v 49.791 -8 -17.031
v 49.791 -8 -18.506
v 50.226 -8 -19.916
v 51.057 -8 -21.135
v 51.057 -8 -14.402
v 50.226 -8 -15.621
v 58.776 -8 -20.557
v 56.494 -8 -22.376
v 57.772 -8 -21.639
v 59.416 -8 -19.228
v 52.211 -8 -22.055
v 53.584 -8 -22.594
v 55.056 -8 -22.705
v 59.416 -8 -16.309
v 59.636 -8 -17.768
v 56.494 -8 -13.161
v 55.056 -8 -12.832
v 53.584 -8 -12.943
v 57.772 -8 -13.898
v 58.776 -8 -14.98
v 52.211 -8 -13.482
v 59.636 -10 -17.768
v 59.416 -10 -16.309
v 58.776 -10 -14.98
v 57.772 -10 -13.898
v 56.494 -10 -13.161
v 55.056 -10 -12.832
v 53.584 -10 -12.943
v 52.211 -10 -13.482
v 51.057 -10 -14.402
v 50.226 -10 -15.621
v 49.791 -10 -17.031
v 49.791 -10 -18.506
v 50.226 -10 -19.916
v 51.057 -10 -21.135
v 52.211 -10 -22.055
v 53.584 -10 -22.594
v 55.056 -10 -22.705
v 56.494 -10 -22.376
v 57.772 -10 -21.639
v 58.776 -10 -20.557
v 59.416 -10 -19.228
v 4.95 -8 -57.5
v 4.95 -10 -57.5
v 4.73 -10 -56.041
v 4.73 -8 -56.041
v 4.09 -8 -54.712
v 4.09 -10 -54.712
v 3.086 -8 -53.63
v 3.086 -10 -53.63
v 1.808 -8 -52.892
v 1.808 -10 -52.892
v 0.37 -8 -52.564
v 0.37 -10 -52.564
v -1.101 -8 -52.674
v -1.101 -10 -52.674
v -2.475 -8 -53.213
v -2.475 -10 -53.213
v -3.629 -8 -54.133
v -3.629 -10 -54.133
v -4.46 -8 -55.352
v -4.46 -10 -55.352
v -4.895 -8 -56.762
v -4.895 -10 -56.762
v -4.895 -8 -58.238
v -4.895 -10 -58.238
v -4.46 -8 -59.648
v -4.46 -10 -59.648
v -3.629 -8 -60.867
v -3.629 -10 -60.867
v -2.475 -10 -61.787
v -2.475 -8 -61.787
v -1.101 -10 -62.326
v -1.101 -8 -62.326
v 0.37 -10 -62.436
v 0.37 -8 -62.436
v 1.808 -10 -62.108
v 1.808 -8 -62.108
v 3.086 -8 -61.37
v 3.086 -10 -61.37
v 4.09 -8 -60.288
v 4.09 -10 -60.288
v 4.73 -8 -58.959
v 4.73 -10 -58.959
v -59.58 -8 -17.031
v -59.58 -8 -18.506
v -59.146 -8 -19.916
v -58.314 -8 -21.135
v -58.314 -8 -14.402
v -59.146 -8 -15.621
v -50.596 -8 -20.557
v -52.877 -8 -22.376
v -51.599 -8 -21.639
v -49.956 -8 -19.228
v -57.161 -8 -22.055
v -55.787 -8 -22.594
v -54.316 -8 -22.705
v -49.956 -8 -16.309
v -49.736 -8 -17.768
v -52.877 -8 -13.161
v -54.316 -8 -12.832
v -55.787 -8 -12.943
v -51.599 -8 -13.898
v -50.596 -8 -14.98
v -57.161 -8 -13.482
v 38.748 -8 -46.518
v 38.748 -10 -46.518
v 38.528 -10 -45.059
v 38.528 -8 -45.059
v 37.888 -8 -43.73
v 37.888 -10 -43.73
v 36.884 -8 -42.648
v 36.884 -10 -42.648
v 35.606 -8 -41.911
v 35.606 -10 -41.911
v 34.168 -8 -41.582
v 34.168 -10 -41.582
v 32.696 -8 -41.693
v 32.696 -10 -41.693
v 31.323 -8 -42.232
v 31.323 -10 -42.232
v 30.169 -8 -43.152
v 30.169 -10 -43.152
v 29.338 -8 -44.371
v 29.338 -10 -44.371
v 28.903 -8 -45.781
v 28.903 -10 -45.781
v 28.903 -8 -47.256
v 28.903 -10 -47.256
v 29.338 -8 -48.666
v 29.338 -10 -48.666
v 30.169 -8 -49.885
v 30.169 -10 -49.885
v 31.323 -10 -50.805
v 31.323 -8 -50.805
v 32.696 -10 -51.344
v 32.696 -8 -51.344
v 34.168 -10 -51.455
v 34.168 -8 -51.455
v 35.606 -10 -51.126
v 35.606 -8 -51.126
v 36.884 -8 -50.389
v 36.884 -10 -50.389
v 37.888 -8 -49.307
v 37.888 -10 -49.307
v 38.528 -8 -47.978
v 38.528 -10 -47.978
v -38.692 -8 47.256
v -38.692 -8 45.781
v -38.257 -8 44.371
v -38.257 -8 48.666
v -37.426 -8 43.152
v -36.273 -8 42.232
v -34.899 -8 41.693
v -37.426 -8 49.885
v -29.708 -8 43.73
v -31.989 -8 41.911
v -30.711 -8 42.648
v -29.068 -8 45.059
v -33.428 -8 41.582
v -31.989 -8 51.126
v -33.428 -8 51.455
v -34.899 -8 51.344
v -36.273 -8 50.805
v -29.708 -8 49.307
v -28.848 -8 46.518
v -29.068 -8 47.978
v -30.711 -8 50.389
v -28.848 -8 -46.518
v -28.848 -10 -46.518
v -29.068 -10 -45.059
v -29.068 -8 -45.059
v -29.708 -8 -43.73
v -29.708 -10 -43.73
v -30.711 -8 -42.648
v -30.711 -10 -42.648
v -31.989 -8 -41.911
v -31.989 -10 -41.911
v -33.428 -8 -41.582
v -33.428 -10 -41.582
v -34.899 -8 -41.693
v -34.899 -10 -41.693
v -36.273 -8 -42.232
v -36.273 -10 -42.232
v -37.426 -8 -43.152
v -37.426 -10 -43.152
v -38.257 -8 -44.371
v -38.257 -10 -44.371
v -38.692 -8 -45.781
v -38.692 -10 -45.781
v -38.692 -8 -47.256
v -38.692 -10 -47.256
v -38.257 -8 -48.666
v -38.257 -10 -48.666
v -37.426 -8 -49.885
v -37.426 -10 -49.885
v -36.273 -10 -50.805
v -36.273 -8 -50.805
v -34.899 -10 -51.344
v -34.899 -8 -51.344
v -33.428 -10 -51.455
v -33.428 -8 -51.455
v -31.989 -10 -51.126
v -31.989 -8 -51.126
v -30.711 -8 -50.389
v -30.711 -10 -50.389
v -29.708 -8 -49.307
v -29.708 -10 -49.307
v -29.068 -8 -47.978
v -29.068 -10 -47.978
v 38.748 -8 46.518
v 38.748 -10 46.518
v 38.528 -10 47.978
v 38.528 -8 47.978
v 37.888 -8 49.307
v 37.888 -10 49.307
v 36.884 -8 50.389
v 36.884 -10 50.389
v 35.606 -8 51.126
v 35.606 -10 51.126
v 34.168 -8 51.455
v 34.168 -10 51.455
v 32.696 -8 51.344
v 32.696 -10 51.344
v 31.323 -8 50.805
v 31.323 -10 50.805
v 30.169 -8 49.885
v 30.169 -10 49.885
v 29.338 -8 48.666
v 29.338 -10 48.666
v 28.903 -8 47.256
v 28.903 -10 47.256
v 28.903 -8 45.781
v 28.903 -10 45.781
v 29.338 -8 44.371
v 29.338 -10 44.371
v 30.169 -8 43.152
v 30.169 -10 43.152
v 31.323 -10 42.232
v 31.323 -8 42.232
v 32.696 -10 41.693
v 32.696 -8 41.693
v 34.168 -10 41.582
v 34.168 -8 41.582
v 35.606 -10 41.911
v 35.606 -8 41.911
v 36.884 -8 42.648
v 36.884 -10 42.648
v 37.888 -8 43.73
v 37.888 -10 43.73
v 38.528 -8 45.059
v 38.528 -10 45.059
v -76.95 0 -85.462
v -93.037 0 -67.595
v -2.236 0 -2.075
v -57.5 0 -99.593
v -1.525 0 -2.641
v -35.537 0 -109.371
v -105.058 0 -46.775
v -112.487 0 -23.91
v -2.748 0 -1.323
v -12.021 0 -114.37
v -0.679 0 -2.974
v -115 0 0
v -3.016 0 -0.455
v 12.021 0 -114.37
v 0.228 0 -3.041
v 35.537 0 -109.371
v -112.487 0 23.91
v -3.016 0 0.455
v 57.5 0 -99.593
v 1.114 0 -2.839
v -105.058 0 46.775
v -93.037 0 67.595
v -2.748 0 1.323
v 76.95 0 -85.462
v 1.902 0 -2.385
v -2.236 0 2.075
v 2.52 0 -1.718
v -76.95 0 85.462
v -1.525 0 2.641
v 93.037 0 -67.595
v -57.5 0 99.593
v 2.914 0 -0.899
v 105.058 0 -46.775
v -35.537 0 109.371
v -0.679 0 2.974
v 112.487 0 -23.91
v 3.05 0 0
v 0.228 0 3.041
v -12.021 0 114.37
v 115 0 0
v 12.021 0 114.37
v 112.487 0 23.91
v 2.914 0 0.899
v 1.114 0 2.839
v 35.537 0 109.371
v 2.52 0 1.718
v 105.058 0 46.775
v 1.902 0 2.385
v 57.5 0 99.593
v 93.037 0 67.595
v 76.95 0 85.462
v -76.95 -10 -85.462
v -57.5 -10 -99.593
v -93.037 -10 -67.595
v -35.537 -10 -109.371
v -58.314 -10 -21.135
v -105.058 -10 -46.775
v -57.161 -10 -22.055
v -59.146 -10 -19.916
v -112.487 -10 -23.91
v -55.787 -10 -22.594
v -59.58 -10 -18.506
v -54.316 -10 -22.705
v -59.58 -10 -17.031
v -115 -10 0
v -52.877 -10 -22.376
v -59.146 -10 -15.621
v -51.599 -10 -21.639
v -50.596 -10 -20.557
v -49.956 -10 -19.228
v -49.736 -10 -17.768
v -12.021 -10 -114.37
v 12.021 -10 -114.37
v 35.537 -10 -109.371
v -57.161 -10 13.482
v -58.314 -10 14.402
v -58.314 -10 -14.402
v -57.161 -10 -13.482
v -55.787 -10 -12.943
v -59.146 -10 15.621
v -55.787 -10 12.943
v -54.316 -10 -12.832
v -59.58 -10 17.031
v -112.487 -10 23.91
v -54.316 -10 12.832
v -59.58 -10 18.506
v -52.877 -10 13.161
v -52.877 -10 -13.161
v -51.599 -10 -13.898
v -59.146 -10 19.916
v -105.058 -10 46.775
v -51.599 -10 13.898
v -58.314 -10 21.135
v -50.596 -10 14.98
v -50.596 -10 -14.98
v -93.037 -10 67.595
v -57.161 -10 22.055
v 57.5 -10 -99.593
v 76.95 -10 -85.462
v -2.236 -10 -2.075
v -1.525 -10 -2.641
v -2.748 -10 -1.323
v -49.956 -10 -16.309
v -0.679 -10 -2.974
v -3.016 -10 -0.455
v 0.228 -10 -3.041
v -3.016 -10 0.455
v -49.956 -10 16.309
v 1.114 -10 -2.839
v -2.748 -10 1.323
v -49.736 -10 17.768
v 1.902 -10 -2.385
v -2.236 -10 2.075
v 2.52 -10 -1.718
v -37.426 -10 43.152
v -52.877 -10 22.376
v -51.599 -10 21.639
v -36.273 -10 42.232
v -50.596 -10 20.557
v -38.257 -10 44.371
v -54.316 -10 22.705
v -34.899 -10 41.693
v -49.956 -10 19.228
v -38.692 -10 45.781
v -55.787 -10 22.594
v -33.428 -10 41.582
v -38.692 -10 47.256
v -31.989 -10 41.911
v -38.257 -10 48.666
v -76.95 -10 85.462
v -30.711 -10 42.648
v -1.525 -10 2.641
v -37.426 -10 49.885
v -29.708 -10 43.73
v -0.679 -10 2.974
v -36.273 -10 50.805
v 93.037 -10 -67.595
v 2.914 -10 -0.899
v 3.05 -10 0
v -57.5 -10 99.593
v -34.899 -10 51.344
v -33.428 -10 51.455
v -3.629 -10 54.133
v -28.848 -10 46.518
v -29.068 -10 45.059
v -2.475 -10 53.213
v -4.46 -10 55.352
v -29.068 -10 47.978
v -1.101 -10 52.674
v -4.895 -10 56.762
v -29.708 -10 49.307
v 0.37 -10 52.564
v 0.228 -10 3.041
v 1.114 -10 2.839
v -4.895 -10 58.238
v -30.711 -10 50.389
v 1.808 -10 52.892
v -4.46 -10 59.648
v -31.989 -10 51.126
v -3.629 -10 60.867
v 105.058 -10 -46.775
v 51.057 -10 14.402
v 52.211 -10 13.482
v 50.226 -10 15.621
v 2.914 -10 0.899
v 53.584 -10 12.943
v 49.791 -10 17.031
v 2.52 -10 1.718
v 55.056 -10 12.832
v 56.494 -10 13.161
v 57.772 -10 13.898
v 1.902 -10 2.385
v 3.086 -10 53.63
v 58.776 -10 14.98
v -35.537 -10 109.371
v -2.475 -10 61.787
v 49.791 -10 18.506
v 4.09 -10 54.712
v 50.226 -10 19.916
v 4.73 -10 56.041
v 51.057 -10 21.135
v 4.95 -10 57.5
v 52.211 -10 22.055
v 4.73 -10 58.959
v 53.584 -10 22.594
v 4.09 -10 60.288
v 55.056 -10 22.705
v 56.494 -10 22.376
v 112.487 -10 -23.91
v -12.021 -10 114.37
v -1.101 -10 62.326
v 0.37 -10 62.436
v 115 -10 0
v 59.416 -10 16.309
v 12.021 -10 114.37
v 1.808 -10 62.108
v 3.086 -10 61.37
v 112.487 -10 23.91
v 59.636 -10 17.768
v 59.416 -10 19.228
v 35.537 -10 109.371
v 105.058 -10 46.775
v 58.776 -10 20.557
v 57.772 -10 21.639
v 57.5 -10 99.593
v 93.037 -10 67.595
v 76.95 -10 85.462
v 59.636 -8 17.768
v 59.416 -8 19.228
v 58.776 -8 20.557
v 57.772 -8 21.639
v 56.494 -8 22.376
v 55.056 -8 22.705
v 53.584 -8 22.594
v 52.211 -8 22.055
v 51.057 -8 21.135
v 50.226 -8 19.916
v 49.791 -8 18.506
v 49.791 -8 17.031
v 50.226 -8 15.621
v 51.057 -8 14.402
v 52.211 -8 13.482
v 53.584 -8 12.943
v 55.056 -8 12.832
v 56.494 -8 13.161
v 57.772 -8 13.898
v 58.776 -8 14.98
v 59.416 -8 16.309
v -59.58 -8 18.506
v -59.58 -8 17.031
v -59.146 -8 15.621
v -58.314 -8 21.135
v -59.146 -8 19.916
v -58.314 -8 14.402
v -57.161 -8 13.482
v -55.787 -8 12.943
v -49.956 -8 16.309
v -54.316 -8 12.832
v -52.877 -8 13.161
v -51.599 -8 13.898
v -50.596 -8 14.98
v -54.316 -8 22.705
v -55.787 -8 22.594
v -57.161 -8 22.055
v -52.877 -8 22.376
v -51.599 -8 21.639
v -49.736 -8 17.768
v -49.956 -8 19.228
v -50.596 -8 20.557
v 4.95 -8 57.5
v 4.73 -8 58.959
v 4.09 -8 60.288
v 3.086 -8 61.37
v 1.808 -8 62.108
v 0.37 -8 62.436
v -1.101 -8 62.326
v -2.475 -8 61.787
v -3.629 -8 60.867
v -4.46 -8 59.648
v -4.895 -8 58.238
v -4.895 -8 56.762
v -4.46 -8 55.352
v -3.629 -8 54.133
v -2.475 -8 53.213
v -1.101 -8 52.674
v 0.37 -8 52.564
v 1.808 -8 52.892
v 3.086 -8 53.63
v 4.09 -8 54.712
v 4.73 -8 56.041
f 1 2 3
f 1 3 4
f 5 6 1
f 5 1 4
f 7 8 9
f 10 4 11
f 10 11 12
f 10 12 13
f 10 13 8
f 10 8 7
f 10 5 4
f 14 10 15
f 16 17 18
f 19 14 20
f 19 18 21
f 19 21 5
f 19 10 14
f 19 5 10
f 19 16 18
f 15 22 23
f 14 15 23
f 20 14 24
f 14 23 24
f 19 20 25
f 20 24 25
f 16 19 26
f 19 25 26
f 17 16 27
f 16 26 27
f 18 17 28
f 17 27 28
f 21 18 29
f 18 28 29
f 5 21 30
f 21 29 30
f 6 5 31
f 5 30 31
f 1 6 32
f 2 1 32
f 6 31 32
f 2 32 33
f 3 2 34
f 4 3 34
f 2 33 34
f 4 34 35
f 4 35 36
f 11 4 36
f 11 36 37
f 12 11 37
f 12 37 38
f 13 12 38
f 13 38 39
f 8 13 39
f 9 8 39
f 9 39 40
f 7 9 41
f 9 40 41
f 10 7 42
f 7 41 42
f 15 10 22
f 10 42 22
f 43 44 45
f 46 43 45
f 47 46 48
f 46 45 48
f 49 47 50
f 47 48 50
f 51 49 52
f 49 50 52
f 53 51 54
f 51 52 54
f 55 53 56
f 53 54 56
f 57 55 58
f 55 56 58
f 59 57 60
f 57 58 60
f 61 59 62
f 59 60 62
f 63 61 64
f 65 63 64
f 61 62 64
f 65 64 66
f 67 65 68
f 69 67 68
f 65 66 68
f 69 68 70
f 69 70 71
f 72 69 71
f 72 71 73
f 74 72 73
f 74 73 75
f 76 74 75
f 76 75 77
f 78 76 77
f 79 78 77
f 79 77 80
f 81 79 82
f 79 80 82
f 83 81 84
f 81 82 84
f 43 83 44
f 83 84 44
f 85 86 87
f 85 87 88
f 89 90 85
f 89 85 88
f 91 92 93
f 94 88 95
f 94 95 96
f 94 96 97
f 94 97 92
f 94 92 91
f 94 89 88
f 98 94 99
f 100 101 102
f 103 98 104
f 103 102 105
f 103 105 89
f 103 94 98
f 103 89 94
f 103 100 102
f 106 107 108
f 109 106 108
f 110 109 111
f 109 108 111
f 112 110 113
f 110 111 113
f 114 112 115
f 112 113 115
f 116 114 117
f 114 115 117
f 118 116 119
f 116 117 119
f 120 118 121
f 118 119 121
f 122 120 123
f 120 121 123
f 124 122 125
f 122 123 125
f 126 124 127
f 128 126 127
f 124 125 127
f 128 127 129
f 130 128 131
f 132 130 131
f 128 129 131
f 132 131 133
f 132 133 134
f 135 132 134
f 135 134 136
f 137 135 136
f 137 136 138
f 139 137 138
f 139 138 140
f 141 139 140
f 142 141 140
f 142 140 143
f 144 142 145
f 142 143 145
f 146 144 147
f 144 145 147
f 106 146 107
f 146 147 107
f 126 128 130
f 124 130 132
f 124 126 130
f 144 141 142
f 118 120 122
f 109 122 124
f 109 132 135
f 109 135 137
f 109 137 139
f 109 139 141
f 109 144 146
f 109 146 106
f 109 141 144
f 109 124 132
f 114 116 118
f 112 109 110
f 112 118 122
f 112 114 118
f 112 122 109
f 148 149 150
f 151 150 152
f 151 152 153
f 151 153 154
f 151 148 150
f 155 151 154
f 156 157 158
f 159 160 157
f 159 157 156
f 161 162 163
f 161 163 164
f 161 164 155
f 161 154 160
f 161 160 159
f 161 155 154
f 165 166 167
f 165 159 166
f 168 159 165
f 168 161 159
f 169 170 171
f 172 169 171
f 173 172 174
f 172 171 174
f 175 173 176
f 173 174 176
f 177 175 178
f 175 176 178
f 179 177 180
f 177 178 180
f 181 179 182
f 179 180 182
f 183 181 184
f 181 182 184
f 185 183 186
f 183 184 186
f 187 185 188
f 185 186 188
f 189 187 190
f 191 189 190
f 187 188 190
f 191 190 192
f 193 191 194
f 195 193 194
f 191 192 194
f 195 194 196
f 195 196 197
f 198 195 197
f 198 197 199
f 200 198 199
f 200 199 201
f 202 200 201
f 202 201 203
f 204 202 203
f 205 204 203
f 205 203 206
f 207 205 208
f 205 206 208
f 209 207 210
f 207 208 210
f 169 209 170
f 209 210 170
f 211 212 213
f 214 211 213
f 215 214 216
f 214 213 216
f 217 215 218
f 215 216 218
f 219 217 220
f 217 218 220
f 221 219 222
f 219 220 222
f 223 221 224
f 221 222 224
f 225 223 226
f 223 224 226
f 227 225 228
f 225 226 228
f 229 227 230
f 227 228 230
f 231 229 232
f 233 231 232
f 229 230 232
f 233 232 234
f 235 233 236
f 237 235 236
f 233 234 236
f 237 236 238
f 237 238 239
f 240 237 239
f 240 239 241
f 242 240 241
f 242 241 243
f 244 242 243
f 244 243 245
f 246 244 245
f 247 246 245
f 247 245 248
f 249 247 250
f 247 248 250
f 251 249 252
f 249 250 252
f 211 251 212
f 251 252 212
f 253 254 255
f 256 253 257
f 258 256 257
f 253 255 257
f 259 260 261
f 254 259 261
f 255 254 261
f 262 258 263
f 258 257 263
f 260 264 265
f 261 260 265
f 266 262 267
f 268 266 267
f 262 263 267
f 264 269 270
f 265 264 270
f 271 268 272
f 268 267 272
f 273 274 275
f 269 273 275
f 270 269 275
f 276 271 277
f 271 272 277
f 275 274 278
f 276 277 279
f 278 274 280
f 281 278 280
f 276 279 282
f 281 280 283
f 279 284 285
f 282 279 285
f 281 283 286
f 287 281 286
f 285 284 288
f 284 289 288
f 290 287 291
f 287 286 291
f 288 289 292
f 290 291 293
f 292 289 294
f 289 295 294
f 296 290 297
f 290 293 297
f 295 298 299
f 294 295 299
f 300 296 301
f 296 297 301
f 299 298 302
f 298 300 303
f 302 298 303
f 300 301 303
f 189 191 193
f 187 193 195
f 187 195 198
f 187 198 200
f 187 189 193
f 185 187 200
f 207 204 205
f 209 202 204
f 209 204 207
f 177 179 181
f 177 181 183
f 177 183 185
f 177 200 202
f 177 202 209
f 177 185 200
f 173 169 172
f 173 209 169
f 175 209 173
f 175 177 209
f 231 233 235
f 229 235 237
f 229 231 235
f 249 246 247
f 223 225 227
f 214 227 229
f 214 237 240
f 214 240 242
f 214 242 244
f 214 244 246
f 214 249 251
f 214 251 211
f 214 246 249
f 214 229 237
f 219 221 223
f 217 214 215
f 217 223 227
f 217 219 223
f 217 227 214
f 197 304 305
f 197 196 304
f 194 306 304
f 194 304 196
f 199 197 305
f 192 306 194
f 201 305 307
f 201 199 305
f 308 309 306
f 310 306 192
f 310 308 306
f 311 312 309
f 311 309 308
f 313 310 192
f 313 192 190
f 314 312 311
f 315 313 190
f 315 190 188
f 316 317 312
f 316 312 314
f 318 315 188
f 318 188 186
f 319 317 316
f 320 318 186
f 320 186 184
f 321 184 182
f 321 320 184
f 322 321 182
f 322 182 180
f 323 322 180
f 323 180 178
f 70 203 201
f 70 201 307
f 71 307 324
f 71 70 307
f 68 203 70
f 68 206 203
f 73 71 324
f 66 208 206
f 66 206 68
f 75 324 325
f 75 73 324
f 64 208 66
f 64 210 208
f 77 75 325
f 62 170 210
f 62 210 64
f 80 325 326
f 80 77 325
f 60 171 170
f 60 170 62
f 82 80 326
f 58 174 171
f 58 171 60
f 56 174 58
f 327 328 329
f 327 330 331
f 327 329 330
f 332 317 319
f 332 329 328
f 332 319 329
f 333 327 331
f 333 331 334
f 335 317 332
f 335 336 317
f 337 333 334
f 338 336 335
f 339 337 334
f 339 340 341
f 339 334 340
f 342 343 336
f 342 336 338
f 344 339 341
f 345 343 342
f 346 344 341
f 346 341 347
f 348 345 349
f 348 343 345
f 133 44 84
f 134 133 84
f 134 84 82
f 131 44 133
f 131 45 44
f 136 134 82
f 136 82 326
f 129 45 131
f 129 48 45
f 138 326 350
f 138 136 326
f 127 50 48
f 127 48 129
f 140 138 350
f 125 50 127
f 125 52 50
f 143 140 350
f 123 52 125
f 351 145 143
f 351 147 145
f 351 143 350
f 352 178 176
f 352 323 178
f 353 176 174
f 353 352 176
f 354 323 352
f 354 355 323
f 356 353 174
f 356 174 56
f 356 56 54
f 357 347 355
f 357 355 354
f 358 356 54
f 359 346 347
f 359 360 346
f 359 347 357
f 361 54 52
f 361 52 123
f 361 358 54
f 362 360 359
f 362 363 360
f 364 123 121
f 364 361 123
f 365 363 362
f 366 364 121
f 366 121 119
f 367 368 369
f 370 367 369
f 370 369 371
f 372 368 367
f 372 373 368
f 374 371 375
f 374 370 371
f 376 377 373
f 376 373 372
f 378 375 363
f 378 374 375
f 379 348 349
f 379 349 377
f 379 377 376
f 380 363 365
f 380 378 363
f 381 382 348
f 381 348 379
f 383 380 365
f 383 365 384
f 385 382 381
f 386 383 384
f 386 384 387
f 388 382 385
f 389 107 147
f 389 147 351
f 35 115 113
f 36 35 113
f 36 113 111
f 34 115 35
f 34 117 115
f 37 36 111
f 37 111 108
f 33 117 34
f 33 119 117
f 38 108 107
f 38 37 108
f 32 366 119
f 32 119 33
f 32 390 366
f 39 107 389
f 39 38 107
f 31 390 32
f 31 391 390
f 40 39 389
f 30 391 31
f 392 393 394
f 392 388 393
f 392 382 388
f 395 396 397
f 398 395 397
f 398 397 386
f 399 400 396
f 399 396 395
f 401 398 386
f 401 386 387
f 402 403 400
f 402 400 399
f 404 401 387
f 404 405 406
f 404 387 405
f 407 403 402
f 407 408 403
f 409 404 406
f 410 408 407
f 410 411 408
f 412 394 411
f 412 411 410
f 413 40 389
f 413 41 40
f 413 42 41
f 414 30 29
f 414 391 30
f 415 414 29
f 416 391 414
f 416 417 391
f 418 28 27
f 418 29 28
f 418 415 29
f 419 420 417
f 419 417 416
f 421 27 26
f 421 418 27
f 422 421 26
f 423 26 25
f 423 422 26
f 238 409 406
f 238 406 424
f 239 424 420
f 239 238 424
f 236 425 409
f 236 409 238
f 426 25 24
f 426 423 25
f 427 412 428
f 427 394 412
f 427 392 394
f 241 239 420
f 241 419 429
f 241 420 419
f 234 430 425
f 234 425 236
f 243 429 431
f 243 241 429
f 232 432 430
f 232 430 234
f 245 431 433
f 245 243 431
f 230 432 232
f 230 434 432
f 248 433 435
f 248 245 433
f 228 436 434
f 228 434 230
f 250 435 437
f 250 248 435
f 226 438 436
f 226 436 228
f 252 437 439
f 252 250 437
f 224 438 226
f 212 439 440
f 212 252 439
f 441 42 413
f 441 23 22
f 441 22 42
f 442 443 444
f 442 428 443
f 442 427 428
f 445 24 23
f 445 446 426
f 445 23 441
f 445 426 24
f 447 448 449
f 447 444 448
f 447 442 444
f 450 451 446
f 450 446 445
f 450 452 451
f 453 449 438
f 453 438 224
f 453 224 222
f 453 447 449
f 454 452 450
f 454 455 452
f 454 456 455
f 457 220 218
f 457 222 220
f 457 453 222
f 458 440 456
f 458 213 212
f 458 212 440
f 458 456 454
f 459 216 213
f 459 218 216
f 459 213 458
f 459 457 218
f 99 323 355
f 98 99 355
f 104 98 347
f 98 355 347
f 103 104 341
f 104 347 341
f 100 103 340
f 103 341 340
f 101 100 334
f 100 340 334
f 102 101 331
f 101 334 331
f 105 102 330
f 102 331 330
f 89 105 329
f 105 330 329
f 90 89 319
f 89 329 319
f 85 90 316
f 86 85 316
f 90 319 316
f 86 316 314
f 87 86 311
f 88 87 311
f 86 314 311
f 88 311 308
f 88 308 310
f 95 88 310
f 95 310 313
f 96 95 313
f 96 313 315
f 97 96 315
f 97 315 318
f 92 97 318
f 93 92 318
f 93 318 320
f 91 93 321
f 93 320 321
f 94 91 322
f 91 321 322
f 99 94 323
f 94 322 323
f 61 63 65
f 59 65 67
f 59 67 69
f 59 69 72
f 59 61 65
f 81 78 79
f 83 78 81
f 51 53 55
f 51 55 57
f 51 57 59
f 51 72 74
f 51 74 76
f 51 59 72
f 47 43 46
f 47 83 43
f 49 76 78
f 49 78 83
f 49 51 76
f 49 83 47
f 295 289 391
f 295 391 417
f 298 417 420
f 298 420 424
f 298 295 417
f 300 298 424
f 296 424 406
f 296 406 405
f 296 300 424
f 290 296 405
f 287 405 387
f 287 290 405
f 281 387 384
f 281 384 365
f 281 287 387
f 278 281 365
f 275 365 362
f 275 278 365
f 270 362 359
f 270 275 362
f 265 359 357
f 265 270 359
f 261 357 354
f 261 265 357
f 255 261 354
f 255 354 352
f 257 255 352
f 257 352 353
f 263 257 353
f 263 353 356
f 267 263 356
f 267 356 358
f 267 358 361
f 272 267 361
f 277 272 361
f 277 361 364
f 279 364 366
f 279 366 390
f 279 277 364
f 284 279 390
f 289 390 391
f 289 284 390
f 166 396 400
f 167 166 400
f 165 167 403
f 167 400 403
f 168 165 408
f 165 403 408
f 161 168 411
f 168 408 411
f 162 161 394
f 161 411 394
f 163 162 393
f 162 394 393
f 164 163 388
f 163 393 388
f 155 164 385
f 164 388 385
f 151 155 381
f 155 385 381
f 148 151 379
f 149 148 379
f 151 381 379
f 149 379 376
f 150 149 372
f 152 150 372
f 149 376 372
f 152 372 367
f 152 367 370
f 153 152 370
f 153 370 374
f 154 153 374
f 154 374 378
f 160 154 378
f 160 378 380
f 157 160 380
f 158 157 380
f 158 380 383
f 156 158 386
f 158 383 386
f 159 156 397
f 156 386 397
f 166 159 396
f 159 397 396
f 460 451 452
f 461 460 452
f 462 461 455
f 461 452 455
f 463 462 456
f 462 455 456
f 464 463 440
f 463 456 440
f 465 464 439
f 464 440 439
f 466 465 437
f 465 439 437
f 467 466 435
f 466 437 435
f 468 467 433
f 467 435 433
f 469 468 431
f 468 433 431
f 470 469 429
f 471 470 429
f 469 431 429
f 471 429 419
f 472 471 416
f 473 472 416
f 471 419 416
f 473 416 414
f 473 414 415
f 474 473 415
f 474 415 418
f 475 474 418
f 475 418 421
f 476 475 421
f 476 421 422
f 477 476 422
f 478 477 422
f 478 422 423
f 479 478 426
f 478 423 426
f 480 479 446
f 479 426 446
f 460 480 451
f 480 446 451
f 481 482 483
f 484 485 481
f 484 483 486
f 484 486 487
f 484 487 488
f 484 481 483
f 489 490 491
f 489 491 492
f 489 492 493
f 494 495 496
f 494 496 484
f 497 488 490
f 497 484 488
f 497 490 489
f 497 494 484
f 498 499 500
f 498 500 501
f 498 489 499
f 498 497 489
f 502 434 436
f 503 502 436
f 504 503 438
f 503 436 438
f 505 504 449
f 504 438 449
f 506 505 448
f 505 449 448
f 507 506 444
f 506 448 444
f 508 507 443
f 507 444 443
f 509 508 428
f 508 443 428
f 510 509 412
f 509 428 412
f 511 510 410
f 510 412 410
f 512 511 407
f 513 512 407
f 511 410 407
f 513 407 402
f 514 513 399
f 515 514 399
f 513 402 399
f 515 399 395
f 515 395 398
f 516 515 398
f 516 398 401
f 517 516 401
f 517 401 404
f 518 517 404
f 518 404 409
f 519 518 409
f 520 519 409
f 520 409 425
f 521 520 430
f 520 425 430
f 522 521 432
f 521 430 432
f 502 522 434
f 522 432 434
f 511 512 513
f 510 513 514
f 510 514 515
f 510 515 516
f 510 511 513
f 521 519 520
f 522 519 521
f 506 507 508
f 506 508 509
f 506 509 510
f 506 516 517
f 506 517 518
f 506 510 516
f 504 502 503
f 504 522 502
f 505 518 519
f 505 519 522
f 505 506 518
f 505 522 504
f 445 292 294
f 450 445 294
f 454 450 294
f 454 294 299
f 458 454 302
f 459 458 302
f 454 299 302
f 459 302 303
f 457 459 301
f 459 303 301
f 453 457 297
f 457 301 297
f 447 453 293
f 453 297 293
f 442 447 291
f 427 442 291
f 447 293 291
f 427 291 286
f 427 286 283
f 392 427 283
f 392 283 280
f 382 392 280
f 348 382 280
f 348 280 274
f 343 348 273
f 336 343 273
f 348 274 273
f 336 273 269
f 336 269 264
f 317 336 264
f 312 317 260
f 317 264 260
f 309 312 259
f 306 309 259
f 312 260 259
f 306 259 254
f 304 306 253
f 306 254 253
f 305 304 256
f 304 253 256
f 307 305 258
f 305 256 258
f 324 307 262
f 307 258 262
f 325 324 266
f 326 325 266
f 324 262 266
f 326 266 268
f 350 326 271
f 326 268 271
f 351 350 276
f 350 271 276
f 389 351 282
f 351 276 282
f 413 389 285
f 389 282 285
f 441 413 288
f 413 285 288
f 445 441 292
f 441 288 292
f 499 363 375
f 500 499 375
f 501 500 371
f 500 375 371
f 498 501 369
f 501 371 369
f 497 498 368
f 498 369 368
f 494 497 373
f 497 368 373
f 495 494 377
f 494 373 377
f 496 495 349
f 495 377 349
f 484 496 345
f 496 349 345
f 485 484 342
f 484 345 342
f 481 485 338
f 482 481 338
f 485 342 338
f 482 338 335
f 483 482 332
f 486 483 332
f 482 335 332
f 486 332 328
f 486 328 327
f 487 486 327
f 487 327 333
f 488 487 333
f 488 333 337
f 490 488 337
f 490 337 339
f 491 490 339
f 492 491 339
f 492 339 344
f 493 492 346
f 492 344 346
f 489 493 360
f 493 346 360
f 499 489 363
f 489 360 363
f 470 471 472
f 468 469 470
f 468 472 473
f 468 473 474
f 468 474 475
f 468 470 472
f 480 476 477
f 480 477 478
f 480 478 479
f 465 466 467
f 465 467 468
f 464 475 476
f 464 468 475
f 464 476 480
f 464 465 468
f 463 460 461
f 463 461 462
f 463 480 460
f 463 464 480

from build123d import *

# Parameters (mm, degrees)
F0_R     = 115
F0_R_2   = 3.05
F1_DEPTH = 10
F2_R     = 4.95
F3_DEPTH = 2


with BuildPart() as f1:
    # F0 (on Front) → F1 (new body)
    with BuildSketch(Plane.XZ):
        Circle(F0_R)
        Circle(F0_R_2, mode=Mode.SUBTRACT)
    extrude(amount=F1_DEPTH)

    # F2 (on face) → F3 (cut)
    with BuildSketch(Plane.XZ.offset(10)):
        with Locations((0, 57.5)):
            Circle(F2_R)
        with Locations((-33.797652, 46.518477)):
            Circle(F2_R)
        with Locations((-54.68575, 17.768477)):
            Circle(F2_R)
        with Locations((-54.68575, -17.768477)):
            Circle(F2_R)
        with Locations((-33.797652, -46.518477)):
            Circle(F2_R)
        with Locations((0, -57.5)):
            Circle(F2_R)
        with Locations((33.797652, -46.518477)):
            Circle(F2_R)
        with Locations((54.68575, -17.768477)):
            Circle(F2_R)
        with Locations((54.68575, 17.768477)):
            Circle(F2_R)
        with Locations((33.797652, 46.518477)):
            Circle(F2_R)
    extrude(amount=-F3_DEPTH, mode=Mode.SUBTRACT)


solid = f1.part
